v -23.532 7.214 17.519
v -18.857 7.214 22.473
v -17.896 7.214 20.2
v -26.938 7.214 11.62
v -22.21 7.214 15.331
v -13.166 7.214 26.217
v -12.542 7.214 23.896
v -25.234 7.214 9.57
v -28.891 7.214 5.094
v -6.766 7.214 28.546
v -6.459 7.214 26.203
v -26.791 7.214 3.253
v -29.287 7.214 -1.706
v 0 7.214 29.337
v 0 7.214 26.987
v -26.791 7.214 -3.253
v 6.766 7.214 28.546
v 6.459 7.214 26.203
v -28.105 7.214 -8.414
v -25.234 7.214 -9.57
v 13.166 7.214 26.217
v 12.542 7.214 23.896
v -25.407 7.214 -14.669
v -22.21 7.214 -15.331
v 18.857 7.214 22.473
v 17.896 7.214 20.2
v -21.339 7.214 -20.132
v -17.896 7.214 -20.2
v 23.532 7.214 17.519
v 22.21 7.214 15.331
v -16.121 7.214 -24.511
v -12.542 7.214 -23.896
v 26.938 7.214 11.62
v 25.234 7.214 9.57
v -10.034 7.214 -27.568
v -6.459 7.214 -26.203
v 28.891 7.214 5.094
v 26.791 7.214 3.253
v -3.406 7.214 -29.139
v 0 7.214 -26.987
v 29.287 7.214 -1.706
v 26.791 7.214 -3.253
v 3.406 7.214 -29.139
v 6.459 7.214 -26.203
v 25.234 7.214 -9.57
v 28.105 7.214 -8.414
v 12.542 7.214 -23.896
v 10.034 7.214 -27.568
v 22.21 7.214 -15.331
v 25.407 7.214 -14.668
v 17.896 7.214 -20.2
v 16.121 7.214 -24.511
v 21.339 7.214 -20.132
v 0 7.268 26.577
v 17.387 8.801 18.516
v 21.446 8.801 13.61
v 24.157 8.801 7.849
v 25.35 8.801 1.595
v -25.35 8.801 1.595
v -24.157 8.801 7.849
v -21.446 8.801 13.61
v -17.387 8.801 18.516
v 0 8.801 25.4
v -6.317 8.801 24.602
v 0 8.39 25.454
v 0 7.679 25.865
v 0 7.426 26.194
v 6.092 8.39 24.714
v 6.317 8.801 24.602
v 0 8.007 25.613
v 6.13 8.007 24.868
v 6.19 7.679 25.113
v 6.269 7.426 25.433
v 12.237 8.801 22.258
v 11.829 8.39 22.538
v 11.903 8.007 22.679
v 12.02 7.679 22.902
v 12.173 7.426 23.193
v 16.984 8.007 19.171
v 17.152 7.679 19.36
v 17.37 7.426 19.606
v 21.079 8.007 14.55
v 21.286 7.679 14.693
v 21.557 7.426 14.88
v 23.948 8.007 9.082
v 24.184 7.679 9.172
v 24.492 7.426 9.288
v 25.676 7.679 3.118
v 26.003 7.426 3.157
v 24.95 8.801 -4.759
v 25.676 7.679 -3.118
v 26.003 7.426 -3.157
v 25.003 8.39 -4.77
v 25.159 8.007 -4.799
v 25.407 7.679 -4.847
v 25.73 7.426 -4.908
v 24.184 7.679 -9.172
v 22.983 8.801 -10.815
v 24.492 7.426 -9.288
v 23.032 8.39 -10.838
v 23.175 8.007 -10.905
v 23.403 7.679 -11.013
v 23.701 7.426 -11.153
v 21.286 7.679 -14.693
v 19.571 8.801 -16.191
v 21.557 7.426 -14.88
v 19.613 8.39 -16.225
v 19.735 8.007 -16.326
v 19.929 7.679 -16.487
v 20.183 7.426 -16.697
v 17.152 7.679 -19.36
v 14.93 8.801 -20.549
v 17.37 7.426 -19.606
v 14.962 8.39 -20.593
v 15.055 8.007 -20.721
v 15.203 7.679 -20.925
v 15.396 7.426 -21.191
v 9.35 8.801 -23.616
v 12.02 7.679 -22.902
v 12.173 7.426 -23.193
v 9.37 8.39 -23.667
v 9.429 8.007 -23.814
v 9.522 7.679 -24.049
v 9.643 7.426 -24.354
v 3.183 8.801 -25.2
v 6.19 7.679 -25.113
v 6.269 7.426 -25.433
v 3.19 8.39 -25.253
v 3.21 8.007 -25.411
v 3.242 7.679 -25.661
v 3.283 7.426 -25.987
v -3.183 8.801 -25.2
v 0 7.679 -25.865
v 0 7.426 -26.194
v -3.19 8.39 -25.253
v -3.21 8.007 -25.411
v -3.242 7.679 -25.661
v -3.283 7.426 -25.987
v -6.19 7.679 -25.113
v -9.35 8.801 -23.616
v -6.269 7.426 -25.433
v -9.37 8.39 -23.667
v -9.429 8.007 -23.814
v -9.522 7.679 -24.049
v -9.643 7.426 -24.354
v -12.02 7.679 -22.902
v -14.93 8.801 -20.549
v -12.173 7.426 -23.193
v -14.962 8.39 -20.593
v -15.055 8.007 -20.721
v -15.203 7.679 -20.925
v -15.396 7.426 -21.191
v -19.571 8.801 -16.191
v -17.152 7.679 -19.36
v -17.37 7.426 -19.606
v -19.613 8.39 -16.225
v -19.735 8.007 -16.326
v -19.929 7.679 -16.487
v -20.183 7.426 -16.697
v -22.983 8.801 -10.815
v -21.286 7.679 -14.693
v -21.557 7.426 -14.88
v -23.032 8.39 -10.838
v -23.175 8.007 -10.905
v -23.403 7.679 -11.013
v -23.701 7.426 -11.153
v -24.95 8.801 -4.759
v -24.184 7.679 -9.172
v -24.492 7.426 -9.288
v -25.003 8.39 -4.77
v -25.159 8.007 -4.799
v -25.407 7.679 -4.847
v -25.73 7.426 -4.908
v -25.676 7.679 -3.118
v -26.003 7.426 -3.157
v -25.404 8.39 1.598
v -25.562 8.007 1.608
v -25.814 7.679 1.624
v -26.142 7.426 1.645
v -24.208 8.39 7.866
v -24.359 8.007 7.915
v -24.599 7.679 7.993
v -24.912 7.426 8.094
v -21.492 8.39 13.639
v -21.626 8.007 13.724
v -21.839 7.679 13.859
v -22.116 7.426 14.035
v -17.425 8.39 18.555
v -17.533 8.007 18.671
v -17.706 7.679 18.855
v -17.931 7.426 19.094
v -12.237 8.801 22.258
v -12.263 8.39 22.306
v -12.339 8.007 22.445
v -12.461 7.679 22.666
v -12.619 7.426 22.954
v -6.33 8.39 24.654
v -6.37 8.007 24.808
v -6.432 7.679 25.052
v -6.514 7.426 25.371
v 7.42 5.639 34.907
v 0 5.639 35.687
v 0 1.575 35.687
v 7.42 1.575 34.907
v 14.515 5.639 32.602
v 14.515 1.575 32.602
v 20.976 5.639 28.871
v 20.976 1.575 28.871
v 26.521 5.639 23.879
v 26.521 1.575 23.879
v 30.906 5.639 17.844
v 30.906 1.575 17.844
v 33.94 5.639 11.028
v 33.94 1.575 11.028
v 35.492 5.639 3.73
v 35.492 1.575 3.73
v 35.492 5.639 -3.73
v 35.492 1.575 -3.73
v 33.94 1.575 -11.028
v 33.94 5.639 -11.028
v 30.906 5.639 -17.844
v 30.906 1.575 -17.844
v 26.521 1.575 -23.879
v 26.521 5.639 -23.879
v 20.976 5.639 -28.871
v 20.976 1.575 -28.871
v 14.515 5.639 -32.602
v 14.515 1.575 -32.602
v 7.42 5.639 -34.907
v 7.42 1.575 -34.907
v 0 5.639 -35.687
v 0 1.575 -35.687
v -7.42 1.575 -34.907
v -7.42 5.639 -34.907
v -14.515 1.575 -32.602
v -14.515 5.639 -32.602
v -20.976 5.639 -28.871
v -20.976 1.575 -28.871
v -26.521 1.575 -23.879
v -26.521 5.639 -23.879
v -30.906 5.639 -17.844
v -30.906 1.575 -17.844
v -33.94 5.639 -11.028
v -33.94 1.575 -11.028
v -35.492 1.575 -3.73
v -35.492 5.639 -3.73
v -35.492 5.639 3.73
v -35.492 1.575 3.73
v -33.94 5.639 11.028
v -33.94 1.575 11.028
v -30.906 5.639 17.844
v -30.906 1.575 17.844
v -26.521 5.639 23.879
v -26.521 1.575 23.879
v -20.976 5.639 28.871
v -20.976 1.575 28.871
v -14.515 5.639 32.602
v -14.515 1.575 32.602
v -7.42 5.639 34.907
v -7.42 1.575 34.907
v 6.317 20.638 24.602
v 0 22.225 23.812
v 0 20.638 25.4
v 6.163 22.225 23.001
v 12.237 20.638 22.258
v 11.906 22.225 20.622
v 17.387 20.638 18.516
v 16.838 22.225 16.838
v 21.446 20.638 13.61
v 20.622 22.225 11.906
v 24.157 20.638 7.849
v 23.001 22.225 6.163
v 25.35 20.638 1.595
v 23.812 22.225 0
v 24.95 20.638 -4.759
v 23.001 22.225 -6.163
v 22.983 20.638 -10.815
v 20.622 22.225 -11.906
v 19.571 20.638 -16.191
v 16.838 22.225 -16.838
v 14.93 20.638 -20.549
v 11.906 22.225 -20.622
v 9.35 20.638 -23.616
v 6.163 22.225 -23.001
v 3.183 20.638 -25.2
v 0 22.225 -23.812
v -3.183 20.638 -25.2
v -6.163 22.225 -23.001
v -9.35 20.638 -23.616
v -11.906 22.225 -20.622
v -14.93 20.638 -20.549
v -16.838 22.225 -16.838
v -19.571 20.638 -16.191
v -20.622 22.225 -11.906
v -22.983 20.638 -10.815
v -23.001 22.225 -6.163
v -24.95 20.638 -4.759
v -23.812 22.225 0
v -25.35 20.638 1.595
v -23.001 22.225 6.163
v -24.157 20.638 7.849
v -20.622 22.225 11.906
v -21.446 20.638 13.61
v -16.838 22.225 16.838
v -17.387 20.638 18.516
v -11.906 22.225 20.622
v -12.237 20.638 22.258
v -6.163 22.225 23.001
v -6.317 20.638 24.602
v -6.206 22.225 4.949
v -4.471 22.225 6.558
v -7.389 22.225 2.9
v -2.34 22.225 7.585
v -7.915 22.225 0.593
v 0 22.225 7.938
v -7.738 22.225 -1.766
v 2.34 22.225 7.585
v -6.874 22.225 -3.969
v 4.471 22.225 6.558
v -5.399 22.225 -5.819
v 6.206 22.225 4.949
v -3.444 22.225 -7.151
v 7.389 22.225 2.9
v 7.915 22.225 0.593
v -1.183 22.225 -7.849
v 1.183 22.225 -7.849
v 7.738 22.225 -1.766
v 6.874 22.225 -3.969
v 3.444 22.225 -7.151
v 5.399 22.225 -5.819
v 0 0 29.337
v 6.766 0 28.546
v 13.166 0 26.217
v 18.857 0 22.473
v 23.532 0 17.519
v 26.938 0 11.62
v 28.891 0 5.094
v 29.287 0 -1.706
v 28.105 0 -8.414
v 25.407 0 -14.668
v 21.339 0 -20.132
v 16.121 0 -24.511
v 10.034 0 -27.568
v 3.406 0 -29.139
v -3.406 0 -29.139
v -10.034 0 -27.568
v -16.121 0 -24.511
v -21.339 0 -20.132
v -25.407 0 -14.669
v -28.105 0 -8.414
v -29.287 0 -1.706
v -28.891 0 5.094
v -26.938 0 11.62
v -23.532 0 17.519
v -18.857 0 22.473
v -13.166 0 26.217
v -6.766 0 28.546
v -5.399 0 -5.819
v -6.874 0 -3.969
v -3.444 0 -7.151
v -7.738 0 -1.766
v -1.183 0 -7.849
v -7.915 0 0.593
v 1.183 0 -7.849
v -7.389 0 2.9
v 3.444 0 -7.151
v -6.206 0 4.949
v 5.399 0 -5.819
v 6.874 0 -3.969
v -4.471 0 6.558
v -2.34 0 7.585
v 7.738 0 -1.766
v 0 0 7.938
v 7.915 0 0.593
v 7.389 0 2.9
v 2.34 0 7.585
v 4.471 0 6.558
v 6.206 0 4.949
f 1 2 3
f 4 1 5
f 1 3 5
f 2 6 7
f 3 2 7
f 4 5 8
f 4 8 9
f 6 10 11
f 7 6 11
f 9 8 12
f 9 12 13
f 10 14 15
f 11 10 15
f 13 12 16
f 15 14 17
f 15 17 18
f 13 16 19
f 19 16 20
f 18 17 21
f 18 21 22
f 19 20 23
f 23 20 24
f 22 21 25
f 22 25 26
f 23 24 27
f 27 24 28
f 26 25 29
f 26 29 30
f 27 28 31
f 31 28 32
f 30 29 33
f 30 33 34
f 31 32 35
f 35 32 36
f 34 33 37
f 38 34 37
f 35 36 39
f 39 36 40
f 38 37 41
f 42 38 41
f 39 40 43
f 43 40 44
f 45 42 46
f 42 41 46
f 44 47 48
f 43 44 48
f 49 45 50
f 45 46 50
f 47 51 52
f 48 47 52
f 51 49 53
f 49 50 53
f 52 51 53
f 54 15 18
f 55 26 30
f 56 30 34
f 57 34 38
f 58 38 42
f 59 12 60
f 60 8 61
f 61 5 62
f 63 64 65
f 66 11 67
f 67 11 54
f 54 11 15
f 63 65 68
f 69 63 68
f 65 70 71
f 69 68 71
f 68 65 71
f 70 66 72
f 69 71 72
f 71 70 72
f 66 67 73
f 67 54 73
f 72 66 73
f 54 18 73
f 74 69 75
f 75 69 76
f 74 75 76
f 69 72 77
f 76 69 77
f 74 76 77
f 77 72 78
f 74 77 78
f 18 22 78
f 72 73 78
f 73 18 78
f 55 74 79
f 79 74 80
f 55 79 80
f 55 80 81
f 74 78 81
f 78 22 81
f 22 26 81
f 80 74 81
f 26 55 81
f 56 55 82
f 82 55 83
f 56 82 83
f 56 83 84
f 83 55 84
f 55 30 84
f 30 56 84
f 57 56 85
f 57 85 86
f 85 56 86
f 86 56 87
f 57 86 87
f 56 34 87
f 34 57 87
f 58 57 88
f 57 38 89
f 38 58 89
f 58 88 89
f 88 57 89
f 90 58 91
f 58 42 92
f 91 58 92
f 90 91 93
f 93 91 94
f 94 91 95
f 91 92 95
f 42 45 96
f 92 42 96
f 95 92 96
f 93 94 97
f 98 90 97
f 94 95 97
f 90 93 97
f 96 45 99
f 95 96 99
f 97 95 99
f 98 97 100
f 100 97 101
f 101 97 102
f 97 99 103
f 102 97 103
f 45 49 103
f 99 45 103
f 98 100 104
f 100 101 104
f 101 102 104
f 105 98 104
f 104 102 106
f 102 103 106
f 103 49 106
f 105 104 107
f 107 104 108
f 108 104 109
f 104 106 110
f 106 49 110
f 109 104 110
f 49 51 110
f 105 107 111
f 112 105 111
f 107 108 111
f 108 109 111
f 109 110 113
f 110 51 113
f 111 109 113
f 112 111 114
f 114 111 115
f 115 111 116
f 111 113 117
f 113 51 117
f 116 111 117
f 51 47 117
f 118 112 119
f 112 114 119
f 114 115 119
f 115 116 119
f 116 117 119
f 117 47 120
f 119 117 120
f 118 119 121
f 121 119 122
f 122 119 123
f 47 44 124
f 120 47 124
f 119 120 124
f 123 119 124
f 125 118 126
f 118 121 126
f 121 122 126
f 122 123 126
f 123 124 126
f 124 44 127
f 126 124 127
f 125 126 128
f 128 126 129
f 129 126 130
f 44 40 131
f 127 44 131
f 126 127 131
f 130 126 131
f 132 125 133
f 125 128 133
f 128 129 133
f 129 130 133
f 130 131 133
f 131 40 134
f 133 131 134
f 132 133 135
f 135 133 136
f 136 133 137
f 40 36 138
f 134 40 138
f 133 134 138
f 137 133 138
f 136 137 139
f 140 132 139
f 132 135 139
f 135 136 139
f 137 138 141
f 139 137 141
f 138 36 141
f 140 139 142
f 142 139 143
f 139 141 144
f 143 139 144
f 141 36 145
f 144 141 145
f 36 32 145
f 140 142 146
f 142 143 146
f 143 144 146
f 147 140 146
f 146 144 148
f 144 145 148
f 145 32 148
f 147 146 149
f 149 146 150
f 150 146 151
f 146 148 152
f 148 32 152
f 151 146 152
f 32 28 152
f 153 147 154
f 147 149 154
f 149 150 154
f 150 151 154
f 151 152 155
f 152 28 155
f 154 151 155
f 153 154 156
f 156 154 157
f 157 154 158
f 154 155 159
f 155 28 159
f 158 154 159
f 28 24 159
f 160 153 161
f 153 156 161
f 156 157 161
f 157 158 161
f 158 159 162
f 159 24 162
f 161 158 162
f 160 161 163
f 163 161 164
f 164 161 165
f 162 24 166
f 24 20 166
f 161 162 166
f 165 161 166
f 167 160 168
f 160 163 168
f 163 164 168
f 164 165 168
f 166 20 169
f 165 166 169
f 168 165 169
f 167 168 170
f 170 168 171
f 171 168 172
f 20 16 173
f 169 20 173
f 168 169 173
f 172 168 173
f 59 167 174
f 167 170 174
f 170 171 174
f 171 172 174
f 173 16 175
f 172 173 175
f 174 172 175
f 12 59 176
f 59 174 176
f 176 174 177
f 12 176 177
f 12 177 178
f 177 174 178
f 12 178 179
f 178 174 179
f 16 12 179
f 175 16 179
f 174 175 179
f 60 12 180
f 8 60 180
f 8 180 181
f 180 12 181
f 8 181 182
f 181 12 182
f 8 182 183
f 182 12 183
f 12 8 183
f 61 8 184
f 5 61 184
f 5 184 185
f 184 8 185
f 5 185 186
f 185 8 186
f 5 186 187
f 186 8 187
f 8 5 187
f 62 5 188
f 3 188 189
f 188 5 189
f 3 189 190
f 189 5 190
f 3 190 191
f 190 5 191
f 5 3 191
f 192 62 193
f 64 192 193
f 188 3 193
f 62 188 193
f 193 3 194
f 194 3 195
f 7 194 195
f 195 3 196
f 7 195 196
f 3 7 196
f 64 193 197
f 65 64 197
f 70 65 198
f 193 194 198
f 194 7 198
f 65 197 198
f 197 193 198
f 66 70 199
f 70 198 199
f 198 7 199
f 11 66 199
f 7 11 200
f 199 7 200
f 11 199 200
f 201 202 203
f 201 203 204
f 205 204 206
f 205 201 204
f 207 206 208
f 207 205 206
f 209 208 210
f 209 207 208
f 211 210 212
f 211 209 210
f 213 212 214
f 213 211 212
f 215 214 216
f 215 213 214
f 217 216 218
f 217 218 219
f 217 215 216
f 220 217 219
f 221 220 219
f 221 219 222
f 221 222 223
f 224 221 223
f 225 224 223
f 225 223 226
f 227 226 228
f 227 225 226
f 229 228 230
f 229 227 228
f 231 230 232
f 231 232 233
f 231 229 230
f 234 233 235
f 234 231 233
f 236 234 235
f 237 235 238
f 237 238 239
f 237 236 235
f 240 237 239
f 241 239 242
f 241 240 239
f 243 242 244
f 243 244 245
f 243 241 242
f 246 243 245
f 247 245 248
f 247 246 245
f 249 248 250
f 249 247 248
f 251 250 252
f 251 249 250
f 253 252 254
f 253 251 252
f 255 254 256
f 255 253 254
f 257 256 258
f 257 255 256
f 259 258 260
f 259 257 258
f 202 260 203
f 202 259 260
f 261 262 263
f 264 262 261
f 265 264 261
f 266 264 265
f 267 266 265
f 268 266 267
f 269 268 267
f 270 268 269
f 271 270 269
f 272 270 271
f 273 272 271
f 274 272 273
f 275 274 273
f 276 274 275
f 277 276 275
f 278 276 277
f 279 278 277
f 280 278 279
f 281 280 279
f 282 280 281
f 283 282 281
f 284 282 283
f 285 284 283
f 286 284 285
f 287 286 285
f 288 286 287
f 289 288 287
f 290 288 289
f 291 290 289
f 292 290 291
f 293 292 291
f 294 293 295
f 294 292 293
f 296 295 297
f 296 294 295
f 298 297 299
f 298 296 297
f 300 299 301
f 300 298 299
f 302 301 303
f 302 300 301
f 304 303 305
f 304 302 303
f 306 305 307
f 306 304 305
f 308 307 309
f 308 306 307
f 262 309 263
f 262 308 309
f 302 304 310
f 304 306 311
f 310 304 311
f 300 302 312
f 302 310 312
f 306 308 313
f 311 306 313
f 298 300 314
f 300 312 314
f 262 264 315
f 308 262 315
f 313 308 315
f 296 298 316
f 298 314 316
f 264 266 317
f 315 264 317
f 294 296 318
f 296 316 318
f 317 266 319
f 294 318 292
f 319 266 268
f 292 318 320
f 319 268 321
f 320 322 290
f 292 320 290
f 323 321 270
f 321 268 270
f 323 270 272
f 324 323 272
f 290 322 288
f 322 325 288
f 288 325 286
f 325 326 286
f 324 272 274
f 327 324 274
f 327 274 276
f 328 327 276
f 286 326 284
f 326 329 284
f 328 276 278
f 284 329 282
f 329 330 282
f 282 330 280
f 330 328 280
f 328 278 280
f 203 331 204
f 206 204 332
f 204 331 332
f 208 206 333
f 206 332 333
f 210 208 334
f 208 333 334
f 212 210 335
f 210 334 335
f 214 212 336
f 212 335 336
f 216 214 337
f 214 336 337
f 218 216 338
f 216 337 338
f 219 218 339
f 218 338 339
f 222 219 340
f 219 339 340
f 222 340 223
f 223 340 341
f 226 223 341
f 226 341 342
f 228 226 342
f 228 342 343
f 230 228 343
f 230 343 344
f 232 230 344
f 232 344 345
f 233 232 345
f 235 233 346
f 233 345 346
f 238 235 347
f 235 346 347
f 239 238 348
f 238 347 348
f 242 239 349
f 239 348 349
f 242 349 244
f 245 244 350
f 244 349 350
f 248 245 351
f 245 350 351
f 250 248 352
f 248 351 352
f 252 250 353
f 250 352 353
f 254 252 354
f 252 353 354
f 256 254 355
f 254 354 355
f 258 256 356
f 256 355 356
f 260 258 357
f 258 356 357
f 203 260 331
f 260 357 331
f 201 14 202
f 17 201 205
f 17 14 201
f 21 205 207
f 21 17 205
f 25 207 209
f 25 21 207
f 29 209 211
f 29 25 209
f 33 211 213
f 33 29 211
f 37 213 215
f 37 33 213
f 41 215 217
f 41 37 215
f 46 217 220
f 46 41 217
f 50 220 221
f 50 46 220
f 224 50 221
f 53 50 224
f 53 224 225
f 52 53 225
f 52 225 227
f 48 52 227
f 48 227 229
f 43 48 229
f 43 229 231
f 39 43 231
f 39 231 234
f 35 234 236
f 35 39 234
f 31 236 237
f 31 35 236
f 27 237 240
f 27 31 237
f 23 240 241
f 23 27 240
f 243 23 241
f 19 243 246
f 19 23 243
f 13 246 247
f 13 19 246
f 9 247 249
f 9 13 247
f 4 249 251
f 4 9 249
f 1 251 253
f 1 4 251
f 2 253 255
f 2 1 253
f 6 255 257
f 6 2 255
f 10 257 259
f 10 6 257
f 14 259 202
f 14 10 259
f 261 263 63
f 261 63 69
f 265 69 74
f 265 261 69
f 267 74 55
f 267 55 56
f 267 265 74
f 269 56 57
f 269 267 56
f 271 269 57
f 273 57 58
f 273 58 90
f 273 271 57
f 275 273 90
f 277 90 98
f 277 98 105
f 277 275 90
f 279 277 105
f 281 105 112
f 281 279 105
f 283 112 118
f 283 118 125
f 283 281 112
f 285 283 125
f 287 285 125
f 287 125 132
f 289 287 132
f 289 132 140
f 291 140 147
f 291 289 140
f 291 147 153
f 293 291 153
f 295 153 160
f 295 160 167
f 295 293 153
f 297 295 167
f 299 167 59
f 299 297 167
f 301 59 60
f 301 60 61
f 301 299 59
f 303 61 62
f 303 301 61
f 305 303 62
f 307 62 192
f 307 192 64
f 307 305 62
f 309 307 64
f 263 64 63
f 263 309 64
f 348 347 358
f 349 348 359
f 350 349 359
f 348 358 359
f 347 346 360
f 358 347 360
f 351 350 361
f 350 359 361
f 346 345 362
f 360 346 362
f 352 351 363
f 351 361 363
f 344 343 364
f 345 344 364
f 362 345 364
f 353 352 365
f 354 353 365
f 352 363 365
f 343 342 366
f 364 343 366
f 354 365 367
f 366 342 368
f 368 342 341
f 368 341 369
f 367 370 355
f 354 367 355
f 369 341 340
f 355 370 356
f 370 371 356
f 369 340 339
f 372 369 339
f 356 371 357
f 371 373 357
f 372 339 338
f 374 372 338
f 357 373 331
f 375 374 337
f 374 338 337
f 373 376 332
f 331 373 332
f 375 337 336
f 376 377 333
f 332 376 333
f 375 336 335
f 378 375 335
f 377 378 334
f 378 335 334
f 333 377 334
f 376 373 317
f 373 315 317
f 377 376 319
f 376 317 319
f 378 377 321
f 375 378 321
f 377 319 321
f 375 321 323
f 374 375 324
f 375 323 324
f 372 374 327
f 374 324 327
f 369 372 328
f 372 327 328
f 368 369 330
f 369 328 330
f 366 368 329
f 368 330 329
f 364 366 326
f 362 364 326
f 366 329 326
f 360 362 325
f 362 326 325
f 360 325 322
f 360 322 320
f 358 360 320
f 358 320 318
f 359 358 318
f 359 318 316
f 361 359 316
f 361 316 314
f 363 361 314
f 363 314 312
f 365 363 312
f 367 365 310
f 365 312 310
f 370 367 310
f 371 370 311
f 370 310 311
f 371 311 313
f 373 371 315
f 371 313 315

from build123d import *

# Parameters (mm, degrees)
F0_W     = 7.2136
F0_H     = 10.287
F0_H_2   = 17.4625
F0_W_2   = 15.0114
F2_R     = 1.5875
F3_SIZE  = 1.5875
F4_SIZE2 = 6.35
F4_SIZE  = 1.5748


with BuildPart() as f1:
    # F0 (on Right) → F1 (revolve)
    with BuildSketch(Plane.YZ):
        with Locations((3.6068, 30.5435)):
            Rectangle(F0_W, F0_H)
        with Locations((3.6068, 16.66875)):
            Rectangle(F0_W, F0_H_2)
        with Locations((14.7193, 16.66875)):
            Rectangle(F0_W_2, F0_H_2)
    revolve(axis=Axis((0, 11.1125, 0), (0, 1, 0)))

    # F2
    f2_edges = [f1.edges().sort_by_distance(p)[0] for p in [
        (0, 7.2136, -25.4),
    ]]
    fillet(f2_edges, radius=F2_R)

    # F3
    f3_edges = [f1.edges().sort_by_distance(p)[0] for p in [
        (0, 22.225, -25.4),
    ]]
    chamfer(f3_edges, length=F3_SIZE)

    # F4
    f4_edges = [f1.edges().sort_by_distance(p)[0] for p in [
        (0, 7.2136, -35.687),
        (0, 0, -35.687),
    ]]
    f4_side = f1.faces().sort_by_distance((0, 3.6068, -35.687))[0]
    chamfer(f4_edges, length=F4_SIZE, length2=F4_SIZE2, reference=f4_side)


solid = f1.part
